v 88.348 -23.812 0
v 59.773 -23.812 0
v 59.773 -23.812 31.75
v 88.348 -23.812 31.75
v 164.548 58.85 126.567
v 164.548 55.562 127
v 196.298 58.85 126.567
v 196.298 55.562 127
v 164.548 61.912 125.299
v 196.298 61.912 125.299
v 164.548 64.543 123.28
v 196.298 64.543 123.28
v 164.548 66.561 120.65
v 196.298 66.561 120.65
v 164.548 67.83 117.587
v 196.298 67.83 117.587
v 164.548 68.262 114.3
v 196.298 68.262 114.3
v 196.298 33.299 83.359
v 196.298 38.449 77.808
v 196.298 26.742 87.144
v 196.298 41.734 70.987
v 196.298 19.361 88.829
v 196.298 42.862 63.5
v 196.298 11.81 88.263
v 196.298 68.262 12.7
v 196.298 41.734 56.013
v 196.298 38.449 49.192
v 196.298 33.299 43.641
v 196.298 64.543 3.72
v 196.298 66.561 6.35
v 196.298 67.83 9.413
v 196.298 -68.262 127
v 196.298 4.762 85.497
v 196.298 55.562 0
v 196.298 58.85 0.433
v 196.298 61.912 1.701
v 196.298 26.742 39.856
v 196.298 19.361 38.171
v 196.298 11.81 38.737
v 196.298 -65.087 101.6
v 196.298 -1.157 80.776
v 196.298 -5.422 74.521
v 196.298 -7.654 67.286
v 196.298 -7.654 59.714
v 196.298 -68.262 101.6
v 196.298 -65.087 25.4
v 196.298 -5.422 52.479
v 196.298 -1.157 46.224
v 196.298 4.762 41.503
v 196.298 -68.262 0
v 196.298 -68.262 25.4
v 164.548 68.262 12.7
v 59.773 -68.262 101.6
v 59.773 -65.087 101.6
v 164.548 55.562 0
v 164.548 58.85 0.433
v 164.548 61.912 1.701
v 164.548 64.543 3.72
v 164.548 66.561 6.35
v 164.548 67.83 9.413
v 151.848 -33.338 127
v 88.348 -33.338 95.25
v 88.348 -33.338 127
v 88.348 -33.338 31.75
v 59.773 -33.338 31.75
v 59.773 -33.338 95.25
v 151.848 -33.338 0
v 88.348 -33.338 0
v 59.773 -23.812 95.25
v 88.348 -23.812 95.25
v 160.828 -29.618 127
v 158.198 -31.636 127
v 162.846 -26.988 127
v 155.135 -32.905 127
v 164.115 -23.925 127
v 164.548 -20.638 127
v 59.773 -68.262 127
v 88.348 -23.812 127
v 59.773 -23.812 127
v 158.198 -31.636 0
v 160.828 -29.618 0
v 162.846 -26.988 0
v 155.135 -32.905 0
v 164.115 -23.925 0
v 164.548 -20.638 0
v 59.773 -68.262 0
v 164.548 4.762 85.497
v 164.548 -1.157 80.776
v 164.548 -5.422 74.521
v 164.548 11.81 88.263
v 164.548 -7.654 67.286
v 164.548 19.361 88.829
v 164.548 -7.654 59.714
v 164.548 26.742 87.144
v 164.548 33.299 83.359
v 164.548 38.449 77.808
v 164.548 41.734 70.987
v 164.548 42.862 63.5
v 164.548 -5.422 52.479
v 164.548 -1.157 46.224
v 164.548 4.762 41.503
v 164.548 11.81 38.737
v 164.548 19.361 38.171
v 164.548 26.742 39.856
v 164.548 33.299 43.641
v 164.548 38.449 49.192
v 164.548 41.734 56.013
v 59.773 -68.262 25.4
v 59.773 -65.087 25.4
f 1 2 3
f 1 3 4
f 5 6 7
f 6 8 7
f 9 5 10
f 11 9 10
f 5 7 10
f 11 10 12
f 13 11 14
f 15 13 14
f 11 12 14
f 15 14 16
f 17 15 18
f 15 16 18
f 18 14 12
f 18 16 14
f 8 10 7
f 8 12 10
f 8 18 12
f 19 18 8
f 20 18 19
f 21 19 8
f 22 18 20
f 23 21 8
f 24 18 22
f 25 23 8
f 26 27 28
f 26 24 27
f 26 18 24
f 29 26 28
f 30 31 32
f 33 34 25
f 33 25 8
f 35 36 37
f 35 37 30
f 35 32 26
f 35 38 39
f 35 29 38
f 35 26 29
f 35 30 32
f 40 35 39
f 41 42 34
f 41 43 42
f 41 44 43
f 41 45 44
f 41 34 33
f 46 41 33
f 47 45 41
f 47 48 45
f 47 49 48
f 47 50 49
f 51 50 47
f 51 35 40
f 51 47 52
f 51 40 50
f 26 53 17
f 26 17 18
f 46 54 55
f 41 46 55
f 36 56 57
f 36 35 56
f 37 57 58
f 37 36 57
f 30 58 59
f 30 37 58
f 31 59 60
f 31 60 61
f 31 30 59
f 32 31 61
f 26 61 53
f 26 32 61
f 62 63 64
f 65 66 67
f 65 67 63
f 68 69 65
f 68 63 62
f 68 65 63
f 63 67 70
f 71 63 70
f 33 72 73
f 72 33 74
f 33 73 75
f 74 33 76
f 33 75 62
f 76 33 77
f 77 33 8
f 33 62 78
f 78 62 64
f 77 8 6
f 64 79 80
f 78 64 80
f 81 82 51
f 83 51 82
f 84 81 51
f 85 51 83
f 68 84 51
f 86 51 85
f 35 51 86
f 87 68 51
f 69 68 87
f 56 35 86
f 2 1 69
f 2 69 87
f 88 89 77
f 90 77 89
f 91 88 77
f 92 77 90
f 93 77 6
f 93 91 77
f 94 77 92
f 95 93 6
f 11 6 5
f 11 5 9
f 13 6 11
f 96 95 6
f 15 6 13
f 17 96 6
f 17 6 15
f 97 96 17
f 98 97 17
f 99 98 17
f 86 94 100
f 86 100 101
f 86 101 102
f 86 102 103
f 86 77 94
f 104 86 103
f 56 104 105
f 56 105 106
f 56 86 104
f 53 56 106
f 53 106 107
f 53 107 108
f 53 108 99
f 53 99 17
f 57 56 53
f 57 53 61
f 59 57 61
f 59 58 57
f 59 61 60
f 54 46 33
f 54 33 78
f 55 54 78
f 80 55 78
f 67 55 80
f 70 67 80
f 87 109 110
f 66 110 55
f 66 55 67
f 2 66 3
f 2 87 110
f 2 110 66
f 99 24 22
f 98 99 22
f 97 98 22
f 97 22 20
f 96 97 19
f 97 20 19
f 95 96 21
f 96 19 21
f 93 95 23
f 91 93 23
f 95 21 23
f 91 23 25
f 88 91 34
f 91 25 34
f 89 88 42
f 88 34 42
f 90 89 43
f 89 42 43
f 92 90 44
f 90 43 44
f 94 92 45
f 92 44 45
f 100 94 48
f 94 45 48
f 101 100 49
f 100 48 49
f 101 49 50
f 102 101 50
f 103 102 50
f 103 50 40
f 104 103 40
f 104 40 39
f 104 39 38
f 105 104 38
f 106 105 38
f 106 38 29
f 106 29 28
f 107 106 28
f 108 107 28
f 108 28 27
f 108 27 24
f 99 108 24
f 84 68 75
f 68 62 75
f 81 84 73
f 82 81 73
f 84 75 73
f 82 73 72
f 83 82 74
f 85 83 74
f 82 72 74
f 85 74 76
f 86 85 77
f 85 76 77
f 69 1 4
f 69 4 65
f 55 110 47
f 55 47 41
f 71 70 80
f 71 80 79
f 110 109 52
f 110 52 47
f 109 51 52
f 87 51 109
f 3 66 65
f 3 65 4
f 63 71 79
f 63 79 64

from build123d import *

# Parameters (mm, degrees)
BOSS_EXTRUDE1_DEPTH = 127
SKETCH2_R           = 25.4
CUT_EXTRUDE1_DEPTH  = 127
SKETCH3_W           = 76.2
SKETCH3_H           = 3.175
CUT_EXTRUDE2_DEPTH  = 199.564459386
SKETCH4_W           = 63.5
SKETCH4_H           = 9.525
CUT_EXTRUDE4_DEPTH  = 50.038
FILLET1_R           = 12.7


with BuildPart() as part:
    # Sketch1 → Boss-Extrude1 (new body)
    with BuildSketch(Plane.XY):
        Polygon((196.297790454, 68.2625), (196.297790454, -68.2625), (59.772790454, -68.2625), (59.772790454, -23.8125), (88.347790454, -23.8125), (88.347790454, -33.3375), (164.547790454, -33.3375), (164.547790454, 68.2625), align=None)
    extrude(amount=BOSS_EXTRUDE1_DEPTH)

    # Sketch2 → Cut-Extrude1 (cut)
    with BuildSketch(Plane(origin=(196.297790454, 0, 0), x_dir=(0, 0, -1), z_dir=(1, 0, 0))):
        with Locations(Location((-63.5, 17.4625, 0), (0, 0, 90))):
            Circle(SKETCH2_R)
    extrude(amount=-CUT_EXTRUDE1_DEPTH, mode=Mode.SUBTRACT)

    # Sketch3 → Cut-Extrude2 (cut, through all)
    with BuildSketch(Plane.ZY.offset(-59.772790454)):
        with Locations((63.5, -66.675)):
            Rectangle(SKETCH3_W, SKETCH3_H)
    extrude(amount=-CUT_EXTRUDE2_DEPTH, mode=Mode.SUBTRACT)

    # Sketch4 → Cut-Extrude4 (cut)
    with BuildSketch(Plane.ZY.offset(-59.772790454)):
        with Locations((63.5, -28.575)):
            Rectangle(SKETCH4_W, SKETCH4_H)
    extrude(amount=-CUT_EXTRUDE4_DEPTH, mode=Mode.SUBTRACT)

    # Fillet1
    fillet1_edges = [part.edges().sort_by_distance(p)[0] for p in [
        (180.422790454, 68.2625, 0),
        (164.547790454, -33.3375, 63.5),
        (180.422790454, 68.2625, 127),
    ]]
    fillet(fillet1_edges, radius=FILLET1_R)


solid = part.part
